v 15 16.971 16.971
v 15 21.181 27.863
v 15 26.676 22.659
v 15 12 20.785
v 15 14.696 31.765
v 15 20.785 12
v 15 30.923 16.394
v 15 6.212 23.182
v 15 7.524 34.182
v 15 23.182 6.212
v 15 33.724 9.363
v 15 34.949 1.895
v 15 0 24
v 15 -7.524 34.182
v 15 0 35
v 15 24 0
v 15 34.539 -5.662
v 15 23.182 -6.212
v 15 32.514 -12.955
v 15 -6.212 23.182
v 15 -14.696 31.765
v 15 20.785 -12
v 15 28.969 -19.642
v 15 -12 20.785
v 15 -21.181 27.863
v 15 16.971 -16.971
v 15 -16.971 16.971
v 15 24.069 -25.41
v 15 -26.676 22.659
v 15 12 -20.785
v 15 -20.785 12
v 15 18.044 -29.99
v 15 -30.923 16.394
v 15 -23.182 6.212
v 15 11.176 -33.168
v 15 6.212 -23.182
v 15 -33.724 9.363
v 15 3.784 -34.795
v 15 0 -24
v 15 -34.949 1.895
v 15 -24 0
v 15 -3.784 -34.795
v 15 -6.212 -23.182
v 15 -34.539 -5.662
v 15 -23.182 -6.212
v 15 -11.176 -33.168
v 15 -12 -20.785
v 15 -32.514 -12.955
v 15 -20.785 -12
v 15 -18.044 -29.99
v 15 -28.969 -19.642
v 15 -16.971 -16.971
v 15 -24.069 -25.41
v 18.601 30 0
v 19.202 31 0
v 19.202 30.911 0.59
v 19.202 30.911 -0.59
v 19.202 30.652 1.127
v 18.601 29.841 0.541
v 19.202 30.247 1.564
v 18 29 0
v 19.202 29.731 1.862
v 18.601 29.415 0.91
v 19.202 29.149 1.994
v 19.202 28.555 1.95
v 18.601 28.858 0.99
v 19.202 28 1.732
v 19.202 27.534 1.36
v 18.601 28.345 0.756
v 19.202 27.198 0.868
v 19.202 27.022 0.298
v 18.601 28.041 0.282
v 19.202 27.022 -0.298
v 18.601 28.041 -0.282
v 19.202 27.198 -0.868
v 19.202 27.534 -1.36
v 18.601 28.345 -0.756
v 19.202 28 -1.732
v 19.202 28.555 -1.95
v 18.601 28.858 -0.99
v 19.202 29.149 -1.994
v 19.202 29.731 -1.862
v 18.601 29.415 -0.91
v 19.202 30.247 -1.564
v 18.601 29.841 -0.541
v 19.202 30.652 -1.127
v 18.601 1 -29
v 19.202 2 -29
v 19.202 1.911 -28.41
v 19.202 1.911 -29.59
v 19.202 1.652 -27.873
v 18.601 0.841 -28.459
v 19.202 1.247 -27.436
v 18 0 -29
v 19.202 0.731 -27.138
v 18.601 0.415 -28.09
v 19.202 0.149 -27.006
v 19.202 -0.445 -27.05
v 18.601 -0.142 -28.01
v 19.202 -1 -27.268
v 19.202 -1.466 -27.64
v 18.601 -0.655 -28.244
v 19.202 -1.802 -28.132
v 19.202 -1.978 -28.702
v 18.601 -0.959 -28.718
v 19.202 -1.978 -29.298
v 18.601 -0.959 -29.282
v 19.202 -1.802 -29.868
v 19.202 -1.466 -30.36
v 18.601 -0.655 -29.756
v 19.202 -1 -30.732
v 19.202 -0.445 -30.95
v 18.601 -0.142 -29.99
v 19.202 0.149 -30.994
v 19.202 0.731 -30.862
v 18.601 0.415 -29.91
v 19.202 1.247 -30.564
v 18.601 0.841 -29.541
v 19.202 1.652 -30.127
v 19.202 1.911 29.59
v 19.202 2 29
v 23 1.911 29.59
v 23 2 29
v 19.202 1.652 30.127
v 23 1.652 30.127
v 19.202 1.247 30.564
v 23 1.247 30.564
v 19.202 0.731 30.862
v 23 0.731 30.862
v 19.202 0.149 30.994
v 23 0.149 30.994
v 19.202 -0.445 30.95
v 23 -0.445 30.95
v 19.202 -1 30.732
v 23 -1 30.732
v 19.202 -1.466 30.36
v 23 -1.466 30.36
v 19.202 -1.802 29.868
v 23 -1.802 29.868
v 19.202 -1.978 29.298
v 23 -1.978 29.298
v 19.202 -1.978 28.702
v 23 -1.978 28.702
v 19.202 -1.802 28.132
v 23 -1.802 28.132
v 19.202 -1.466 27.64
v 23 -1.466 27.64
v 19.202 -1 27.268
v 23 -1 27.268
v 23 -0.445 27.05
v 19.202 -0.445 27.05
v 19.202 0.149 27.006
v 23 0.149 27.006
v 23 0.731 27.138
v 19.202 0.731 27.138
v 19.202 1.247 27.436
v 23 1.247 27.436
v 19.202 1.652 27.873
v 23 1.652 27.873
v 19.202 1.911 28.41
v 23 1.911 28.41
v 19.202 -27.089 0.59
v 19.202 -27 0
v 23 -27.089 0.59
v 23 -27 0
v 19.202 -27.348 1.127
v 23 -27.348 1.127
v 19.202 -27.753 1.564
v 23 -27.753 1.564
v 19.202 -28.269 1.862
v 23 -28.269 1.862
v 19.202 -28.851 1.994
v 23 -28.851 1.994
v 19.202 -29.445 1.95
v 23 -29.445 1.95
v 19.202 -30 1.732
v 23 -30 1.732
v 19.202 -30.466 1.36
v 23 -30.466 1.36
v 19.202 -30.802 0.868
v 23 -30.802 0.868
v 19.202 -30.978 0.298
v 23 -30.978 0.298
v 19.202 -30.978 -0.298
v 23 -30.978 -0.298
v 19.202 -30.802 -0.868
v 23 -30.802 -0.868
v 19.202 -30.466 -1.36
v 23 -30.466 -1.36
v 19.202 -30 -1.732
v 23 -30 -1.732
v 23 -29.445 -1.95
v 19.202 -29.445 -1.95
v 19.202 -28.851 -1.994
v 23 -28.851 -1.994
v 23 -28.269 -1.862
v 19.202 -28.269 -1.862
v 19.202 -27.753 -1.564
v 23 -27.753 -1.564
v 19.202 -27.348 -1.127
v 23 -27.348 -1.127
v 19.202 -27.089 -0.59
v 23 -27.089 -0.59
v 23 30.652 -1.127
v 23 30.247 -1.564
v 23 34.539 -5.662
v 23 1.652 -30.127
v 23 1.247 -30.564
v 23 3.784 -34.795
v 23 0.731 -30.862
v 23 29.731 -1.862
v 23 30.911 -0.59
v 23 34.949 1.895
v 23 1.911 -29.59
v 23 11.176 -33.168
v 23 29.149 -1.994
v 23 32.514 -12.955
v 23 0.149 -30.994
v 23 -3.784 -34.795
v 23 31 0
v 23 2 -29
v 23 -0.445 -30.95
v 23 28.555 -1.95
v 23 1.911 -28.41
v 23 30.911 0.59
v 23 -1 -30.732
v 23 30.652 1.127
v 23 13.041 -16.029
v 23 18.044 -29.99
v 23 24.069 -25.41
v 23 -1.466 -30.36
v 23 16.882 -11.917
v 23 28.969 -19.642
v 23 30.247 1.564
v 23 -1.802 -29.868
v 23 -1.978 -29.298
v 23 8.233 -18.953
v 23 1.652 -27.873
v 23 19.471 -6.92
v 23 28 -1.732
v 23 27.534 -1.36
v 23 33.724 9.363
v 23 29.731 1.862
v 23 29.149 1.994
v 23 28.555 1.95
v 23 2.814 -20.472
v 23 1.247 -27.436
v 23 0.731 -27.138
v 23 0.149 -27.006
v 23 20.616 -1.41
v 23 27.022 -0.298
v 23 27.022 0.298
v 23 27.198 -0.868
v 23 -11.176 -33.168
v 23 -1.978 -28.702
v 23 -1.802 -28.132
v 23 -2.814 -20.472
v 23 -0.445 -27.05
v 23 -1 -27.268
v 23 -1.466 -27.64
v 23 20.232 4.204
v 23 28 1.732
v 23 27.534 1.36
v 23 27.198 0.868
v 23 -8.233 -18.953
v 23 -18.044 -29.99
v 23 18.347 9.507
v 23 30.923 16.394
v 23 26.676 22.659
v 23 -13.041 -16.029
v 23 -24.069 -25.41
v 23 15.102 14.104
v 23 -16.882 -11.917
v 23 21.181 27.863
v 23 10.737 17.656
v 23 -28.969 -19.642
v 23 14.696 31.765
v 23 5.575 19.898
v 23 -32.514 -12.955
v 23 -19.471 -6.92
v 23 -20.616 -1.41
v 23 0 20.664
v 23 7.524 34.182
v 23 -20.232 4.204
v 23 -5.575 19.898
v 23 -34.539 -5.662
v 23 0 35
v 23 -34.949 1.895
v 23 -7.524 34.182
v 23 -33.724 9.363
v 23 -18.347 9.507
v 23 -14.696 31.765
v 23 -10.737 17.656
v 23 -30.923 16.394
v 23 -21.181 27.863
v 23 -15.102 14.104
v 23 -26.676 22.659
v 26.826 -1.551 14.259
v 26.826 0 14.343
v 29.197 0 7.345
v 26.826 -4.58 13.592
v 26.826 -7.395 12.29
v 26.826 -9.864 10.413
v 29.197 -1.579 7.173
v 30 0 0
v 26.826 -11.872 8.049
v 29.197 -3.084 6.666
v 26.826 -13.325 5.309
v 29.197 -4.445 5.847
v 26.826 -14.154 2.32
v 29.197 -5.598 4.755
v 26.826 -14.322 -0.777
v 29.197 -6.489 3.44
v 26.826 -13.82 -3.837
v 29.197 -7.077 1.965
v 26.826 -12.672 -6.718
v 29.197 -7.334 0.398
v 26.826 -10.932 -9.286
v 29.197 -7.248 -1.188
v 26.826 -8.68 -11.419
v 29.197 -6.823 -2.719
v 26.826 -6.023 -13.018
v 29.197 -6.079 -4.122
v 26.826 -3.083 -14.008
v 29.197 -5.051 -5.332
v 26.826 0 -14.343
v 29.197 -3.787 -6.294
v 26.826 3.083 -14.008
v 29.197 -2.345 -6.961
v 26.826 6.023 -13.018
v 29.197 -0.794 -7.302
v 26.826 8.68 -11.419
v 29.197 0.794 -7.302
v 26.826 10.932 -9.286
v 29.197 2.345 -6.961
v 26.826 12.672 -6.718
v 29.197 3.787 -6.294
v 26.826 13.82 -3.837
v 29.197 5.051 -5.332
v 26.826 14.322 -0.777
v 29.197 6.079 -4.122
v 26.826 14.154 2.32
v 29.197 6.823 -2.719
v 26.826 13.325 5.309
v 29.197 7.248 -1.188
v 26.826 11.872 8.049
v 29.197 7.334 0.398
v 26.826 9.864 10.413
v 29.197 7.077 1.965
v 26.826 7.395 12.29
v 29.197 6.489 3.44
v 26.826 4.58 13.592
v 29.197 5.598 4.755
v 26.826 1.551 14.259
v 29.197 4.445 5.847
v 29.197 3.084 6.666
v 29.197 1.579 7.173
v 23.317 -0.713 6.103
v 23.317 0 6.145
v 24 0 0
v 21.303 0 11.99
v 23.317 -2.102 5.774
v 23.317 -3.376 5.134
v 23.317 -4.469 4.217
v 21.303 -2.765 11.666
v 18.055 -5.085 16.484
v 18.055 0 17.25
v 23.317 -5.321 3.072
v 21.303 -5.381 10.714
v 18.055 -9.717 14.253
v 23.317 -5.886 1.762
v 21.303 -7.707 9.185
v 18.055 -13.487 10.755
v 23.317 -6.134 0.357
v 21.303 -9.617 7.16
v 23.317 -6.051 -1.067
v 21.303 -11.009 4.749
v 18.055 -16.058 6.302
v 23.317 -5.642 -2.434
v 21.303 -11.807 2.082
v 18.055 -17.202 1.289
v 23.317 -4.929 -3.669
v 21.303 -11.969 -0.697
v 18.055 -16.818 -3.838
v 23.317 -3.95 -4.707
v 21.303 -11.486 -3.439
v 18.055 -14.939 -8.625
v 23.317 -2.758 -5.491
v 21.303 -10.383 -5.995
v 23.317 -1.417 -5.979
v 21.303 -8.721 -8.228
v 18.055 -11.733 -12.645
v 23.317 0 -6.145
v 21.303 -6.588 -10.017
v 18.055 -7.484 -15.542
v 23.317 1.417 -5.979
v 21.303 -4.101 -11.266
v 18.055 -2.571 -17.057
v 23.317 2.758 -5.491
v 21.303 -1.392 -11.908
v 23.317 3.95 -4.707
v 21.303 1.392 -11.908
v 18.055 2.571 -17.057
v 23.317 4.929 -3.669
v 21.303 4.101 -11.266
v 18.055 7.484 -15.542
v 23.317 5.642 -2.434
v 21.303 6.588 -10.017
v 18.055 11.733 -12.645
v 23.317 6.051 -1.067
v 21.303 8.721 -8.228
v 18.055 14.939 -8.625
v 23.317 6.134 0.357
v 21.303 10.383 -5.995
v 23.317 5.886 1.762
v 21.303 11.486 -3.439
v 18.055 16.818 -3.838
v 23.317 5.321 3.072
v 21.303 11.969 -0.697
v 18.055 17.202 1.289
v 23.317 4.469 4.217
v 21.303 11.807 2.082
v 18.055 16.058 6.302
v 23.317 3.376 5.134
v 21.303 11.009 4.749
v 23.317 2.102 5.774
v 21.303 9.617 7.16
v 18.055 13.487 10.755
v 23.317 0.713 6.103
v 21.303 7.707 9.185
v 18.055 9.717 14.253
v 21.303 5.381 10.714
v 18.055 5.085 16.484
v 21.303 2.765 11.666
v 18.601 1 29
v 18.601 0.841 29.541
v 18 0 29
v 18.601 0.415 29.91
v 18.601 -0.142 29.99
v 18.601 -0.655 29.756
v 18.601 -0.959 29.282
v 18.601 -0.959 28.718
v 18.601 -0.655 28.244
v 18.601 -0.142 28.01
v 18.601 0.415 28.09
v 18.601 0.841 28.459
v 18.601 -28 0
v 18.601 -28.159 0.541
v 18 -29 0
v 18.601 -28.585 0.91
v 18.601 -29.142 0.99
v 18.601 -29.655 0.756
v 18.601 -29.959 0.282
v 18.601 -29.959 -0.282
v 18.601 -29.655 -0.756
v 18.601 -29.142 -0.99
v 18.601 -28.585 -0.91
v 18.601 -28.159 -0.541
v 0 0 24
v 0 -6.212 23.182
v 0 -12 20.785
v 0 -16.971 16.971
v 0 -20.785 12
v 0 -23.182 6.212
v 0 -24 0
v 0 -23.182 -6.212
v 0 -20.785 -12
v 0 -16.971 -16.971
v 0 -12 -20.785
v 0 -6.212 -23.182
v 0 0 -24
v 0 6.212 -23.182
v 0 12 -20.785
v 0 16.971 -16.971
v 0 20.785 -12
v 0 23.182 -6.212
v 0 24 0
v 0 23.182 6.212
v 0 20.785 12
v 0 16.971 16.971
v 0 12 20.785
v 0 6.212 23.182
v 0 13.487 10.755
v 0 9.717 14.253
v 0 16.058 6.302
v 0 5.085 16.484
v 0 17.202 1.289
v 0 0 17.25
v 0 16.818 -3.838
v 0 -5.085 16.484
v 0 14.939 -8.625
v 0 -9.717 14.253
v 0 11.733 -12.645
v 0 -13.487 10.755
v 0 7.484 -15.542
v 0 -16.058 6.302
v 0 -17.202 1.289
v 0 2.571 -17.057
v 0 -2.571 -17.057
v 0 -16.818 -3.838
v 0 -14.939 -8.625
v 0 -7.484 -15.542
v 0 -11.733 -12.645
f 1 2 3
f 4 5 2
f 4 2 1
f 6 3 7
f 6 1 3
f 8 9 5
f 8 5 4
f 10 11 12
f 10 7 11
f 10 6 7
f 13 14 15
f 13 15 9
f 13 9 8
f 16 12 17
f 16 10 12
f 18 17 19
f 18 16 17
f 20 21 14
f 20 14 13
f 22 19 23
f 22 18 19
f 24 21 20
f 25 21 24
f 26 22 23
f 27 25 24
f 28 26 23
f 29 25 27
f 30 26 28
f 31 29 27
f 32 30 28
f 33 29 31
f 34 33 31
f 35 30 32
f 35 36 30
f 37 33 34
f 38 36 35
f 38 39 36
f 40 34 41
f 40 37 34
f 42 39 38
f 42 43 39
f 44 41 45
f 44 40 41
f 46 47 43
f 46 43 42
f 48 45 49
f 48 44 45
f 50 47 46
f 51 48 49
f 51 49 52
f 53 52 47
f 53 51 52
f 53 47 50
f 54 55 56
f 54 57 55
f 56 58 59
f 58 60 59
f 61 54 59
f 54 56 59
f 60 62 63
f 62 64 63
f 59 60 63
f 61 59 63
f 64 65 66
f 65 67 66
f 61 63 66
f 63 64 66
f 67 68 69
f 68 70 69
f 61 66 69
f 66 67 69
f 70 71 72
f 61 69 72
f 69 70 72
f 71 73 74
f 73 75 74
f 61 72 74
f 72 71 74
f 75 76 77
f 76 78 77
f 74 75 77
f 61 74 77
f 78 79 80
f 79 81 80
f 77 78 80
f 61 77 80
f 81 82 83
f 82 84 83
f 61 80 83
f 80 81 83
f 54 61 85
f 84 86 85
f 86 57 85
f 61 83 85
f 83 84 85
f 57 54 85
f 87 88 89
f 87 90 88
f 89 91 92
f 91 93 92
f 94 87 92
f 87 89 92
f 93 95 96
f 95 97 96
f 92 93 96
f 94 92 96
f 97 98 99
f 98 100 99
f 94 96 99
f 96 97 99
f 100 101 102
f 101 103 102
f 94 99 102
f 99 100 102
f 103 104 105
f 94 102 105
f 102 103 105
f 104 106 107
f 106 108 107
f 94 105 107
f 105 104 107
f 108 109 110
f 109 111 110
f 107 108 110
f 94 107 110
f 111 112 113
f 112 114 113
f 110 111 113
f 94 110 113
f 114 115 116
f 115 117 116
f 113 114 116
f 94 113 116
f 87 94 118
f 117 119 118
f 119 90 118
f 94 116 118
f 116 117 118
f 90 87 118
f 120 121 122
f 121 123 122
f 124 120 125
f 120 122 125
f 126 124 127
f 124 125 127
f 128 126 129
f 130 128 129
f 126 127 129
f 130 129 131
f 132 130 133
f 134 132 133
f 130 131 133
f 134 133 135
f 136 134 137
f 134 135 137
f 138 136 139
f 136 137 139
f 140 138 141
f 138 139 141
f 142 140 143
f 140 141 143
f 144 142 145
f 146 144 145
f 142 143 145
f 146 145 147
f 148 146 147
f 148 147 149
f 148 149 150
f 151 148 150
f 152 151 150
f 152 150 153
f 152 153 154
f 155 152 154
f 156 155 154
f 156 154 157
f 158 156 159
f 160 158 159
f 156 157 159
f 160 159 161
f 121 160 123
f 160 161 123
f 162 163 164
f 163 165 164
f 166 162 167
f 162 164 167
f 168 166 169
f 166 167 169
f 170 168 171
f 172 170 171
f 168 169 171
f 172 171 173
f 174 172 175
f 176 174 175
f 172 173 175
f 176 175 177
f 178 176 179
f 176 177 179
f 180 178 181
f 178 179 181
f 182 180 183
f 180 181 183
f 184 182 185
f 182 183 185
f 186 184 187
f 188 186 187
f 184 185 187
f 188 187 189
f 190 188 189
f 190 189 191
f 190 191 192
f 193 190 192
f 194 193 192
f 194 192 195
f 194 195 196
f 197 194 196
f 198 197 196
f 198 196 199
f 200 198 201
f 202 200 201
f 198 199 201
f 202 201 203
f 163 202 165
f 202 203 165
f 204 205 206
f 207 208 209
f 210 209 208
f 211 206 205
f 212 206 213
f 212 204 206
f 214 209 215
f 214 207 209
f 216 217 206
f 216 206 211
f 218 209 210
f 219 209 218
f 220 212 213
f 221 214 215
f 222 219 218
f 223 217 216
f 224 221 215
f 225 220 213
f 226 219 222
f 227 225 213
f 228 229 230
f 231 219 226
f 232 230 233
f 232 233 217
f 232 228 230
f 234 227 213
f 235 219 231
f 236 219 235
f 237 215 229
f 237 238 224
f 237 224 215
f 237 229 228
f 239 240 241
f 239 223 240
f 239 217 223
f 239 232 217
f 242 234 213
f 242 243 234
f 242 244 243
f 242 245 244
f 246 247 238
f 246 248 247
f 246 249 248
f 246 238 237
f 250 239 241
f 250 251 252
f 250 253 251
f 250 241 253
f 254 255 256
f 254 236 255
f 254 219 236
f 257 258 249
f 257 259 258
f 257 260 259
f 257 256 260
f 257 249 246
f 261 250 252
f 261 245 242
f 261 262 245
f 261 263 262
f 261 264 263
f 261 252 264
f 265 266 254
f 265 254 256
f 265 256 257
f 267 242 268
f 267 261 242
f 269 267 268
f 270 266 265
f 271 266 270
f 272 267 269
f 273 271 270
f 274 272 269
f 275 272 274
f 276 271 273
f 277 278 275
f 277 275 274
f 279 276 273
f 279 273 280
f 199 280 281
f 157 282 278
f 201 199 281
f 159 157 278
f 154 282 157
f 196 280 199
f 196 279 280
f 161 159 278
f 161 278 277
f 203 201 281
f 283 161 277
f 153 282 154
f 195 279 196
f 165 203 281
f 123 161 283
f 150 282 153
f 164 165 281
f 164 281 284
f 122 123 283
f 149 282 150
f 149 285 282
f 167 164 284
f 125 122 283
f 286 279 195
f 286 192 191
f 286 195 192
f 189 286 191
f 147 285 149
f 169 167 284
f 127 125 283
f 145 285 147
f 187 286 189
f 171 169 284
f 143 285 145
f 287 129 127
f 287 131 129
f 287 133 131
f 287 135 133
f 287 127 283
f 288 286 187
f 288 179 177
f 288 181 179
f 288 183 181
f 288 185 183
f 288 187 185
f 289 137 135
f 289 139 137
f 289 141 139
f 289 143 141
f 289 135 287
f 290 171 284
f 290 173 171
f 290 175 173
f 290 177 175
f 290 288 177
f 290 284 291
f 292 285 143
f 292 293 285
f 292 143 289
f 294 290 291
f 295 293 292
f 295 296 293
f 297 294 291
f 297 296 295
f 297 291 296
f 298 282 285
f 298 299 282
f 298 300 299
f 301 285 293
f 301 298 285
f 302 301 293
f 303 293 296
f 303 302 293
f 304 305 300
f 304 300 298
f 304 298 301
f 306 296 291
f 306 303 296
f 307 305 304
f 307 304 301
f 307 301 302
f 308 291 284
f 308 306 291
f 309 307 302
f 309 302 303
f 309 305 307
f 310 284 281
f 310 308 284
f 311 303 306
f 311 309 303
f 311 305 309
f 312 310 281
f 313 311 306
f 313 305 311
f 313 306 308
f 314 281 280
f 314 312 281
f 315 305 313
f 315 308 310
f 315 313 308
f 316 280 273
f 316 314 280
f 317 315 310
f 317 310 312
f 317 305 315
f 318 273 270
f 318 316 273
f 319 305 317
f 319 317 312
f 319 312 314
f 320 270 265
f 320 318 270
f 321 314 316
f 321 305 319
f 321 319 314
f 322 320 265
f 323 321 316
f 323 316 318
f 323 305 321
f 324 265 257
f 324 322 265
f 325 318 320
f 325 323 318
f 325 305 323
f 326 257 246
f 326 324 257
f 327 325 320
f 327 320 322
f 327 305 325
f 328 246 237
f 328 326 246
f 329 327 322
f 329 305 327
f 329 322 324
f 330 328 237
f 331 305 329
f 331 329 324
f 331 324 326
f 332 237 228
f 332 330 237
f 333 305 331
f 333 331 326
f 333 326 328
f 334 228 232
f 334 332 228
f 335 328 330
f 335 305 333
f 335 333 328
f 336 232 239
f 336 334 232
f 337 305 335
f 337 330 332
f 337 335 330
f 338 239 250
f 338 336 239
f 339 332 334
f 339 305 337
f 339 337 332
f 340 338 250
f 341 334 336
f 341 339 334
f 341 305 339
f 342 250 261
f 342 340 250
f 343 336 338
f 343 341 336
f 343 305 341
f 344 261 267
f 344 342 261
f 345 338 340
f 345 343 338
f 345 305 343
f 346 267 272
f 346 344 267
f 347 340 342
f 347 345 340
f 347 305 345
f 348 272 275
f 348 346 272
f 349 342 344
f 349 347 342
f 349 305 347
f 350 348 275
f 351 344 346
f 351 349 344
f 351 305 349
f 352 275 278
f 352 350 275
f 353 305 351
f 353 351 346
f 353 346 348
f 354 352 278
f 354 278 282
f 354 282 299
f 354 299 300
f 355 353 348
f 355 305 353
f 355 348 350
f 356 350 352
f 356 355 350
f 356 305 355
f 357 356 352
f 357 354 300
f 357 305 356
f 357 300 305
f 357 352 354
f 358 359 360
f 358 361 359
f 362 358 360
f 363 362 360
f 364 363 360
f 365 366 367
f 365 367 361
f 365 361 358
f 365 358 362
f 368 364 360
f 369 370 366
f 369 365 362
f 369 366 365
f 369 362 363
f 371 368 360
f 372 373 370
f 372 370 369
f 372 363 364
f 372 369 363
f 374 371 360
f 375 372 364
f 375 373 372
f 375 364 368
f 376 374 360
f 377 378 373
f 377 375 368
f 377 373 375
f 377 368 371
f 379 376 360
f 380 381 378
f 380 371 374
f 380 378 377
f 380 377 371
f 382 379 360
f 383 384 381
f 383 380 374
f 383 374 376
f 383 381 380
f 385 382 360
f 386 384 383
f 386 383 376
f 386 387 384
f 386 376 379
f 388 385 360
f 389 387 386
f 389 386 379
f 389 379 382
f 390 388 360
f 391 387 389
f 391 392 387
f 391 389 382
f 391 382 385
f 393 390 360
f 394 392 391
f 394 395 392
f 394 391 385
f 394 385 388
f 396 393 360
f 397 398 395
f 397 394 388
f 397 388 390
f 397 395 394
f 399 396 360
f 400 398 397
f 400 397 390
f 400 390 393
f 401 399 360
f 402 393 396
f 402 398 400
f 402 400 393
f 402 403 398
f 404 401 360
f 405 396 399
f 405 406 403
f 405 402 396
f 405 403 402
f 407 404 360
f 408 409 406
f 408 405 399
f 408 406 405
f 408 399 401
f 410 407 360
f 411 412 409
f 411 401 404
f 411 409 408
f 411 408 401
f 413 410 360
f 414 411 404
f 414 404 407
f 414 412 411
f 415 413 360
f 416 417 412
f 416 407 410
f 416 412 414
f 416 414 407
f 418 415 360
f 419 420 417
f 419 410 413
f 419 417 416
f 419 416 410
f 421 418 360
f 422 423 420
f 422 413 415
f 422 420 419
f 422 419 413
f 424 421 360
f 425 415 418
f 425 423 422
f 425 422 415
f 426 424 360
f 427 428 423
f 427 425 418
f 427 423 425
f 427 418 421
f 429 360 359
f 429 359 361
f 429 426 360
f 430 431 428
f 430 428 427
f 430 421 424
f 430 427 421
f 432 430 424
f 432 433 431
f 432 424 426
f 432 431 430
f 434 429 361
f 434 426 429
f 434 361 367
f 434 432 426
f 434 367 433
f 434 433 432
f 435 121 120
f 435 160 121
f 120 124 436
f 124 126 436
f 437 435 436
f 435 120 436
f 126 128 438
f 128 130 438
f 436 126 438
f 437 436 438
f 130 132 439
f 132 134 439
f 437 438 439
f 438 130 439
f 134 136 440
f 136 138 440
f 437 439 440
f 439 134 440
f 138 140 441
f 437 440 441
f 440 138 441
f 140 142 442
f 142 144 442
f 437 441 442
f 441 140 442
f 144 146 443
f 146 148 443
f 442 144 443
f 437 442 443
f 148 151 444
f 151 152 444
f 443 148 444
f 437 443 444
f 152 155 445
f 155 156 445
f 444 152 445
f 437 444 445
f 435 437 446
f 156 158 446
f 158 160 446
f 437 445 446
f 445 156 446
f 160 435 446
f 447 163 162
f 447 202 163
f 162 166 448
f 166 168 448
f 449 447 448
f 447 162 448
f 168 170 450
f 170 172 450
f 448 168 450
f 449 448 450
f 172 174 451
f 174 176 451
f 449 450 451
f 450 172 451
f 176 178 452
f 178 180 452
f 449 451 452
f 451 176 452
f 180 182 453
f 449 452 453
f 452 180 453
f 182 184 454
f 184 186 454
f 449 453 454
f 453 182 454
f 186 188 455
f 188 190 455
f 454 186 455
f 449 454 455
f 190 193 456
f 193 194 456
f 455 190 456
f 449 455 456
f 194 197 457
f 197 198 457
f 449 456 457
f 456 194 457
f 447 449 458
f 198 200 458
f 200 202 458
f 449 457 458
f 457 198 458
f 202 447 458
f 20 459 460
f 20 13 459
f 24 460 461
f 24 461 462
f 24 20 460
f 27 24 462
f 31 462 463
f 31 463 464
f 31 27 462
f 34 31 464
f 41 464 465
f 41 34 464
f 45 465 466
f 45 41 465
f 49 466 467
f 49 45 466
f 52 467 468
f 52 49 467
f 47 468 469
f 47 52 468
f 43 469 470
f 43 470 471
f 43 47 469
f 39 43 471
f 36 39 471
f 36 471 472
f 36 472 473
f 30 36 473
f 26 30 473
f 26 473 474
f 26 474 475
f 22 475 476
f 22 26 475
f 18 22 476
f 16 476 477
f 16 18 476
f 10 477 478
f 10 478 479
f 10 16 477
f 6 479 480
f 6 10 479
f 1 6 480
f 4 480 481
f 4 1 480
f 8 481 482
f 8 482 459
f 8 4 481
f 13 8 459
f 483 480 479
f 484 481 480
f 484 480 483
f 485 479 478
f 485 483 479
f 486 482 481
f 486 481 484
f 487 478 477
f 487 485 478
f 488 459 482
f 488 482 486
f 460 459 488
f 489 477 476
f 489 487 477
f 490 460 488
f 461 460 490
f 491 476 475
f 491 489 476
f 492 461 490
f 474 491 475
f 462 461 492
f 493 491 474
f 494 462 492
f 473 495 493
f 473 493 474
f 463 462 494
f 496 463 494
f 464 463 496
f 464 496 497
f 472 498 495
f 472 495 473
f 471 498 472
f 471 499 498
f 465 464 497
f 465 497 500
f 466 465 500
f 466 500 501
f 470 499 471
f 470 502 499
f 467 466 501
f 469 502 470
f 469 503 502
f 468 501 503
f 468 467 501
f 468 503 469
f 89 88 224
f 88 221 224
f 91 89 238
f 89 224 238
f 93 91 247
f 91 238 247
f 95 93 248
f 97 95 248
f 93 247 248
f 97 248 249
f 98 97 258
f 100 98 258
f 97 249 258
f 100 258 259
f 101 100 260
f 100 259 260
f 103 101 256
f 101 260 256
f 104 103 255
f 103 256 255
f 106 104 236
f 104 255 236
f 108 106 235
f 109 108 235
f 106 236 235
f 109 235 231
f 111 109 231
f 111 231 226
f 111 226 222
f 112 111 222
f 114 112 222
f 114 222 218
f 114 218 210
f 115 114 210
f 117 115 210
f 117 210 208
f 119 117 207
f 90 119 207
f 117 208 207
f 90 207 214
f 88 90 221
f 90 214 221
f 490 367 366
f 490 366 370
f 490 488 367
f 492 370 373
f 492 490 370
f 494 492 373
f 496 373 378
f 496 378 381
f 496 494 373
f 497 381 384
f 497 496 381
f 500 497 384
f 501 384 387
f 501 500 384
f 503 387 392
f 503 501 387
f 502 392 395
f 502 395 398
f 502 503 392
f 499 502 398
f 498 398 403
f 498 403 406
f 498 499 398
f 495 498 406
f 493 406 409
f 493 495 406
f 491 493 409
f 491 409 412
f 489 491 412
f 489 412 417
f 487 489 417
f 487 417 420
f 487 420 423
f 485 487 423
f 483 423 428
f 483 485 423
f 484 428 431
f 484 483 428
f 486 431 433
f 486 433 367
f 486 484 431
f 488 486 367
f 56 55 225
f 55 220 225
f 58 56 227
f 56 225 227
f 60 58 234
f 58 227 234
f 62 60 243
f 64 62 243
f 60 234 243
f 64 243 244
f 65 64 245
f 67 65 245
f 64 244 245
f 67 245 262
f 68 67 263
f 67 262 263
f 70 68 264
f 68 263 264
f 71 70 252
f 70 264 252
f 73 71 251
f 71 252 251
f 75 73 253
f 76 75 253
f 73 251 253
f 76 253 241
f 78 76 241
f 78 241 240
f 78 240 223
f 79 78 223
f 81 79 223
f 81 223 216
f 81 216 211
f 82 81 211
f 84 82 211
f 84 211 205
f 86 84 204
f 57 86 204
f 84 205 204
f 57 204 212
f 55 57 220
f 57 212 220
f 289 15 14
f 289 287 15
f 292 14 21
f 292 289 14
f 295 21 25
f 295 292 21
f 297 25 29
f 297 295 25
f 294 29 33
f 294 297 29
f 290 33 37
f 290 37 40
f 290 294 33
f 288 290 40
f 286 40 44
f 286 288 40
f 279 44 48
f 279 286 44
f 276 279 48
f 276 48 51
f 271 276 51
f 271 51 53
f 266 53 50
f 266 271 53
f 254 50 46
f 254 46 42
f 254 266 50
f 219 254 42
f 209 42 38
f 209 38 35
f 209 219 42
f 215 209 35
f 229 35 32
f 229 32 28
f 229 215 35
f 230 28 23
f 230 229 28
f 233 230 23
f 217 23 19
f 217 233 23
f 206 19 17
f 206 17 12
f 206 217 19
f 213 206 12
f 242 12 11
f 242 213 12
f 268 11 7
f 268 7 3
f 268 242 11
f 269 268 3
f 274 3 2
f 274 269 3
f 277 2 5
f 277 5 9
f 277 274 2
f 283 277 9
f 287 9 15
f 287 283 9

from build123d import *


# Read off the part's stored shape, not the designer's step: Ø4.0mm 暗销孔1
with BuildPart() as part:
    # 草图1 → 旋转1 (revolve)
    with BuildSketch(Plane.XY, mode=Mode.PRIVATE) as revolve_1_sk:
        with BuildLine():
            Line((0, 17.25), (0, 24))
            Line((0, 24), (15, 24))
            Line((15, 24), (15, 35))
            Line((15, 35), (23, 35))
            Line((23, 35), (23, 20.66397832))
            ThreePointArc((23, 20.66397832), (28.202484376, 10.908712115), (30, 0))
            Line((30, 0), (24, 0))
            ThreePointArc((24, 0), (22.472147517, 9.122795944), (18.055328154, 17.25))
            Line((18.055328154, 17.25), (0, 17.25))
        make_face()
    revolve(revolve_1_sk.sketch.rotate(Axis((0, 0, 0), (1, 0, 0)), 90), axis=Axis((0, 0, 0), (1, 0, 0)))

    # Ø4.0mm 暗销孔1 outline → Ø4.0mm 暗销孔1 (revolve, cut)
    with BuildSketch(Plane(origin=(0, 29, 0), x_dir=(0, 1, 0), z_dir=(0, 0, -1))):
        Polygon((0, 23), (0, 18), (2, 19.201721238), (2, 23), align=None)
    revolve(axis=Axis((0, 29, 0), (1, 0, 0)), mode=Mode.SUBTRACT)

    # 4.0mm _1 2 outline → 4.0mm _1 2 (revolve, cut)
    with BuildSketch(Plane.YX.offset(-29)):
        Polygon((0, 23), (0, 18), (2, 19.201721238), (2, 23), align=None)
    revolve(axis=Axis((0, 0, 29), (1, 0, 0)), mode=Mode.SUBTRACT)

    # 4.0mm _1 3 outline → 4.0mm _1 3 (revolve, cut)
    with BuildSketch(Plane(origin=(0, -29, 0), x_dir=(0, 1, 0), z_dir=(0, 0, -1))):
        Polygon((0, 23), (0, 18), (2, 19.201721238), (2, 23), align=None)
    revolve(axis=Axis((0, -29, 0), (1, 0, 0)), mode=Mode.SUBTRACT)

    # 4.0mm _1 4 outline → 4.0mm _1 4 (revolve, cut)
    with BuildSketch(Plane.YX.offset(29)):
        Polygon((0, 23), (0, 18), (2, 19.201721238), (2, 23), align=None)
    revolve(axis=Axis((0, 0, -29), (1, 0, 0)), mode=Mode.SUBTRACT)


solid = part.part
